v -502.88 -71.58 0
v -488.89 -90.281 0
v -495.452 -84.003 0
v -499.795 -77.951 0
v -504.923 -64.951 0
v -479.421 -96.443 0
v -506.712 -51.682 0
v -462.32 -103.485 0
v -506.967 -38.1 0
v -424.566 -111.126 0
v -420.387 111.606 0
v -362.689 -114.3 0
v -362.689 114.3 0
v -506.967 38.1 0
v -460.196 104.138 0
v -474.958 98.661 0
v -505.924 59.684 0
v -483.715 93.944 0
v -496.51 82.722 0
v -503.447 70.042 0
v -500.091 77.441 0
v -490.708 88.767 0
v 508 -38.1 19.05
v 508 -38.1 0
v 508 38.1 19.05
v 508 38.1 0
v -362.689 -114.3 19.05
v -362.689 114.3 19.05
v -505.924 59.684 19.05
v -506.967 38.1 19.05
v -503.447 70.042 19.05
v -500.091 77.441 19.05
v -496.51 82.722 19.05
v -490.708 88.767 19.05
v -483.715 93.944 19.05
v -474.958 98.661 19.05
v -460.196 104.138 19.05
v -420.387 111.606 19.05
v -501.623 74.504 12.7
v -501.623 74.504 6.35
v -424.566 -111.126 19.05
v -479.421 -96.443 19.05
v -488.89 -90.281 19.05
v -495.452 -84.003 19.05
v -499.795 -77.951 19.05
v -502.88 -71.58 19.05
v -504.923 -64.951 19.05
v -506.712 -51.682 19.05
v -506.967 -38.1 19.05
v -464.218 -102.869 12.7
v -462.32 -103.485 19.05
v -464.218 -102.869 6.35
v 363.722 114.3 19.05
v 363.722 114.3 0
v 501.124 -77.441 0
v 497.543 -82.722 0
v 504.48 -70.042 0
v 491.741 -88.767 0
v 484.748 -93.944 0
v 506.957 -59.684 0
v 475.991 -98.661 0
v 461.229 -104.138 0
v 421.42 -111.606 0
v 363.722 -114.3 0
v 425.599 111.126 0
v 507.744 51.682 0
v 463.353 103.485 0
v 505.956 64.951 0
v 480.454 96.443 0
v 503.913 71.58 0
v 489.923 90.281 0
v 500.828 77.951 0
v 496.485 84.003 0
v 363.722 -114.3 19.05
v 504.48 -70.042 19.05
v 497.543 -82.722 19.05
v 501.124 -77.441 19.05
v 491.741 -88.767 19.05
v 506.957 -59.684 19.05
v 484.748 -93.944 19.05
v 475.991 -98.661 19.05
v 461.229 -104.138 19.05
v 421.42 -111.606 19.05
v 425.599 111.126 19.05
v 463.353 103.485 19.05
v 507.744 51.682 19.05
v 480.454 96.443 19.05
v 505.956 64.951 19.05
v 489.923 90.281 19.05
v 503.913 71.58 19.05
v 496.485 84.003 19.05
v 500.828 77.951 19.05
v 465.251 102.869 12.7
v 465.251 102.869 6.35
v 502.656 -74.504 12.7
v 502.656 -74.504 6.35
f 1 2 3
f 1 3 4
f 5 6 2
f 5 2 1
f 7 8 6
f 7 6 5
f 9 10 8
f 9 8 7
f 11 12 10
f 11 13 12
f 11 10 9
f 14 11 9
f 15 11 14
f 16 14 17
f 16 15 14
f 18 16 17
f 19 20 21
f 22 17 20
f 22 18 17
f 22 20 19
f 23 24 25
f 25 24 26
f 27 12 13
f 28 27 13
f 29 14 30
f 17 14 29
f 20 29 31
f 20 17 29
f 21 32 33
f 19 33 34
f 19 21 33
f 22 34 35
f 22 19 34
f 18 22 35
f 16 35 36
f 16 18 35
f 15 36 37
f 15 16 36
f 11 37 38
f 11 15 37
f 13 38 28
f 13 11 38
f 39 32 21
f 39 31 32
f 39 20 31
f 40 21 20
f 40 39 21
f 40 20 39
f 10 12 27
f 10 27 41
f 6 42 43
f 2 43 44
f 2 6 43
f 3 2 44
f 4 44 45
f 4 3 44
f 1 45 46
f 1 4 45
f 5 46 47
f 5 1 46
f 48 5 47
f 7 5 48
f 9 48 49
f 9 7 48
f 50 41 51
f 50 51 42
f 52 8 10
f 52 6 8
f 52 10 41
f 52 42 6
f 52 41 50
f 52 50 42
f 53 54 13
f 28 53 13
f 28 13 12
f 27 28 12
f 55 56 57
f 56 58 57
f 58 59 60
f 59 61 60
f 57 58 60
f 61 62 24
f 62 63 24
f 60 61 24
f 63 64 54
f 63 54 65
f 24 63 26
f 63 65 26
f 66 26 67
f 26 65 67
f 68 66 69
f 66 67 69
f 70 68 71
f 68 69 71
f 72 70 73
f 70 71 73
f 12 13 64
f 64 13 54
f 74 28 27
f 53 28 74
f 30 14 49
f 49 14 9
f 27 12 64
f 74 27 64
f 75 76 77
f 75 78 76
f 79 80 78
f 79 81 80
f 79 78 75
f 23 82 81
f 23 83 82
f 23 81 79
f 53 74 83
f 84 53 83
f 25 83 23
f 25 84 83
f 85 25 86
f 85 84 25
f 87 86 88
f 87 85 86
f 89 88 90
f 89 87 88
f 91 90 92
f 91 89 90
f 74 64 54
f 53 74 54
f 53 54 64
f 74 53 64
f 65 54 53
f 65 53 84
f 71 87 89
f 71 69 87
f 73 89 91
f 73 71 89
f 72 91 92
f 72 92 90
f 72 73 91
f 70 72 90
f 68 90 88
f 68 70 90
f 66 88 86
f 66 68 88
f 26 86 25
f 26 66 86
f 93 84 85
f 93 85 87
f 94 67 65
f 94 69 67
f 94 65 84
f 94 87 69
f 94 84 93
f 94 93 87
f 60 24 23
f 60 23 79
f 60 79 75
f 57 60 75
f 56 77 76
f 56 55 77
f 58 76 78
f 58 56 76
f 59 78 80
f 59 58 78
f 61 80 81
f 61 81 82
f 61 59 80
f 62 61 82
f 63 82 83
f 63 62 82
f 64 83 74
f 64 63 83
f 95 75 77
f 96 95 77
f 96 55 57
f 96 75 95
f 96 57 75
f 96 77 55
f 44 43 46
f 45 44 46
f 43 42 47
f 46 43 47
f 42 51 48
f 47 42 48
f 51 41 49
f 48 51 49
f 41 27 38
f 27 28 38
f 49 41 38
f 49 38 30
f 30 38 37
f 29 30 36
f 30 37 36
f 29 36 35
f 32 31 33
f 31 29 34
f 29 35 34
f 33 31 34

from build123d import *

# Parameters (mm, degrees)
F1_DEPTH = 19.05
F2_DEPTH = 19.05


# Not quite as in the source:
# - ends of sketch curves that miss each other by under 0.0002 mm in the source are joined


with BuildPart() as f1:
    # F0 (on Top) → F1 (new body)
    with BuildSketch(Plane.XY):
        Polygon((-362.6891076565, 114.2999976873), (-362.6891076565, -114.3000023127), (363.7220774023, -114.3), (363.7220774023, 114.3), align=None)
    extrude(amount=F1_DEPTH)


with BuildPart() as f2:
    # F0 (on Top) → F2 (new body)
    with BuildSketch(Plane.XY):
        with BuildLine():
            Line((363.7220774023, 114.3), (363.7220774023, -114.3))
            add(Edge.make_bspline(
                [(508, -38.1), (508, -75.5596795078), (508, -114.3), (363.7220774023, -114.3)],
                knots=[0.6273362794, 0.6273362794, 0.6273362794, 0.6273362794, 1, 1, 1, 1], degree=3))
            Line((508, -38.1), (508, 38.1))
            add(Edge.make_bspline(
                [(363.7220774023, 114.3), (508, 114.3), (508, 75.5596795078), (508, 38.1)],
                knots=[0, 0, 0, 0, 0.3726637206, 0.3726637206, 0.3726637206, 0.3726637206], degree=3))
        make_face()
    extrude(amount=F2_DEPTH)


with BuildPart() as f2b:
    # F0 (on Top) → F2, piece 2 (new body)
    with BuildSketch(Plane.XY):
        with BuildLine():
            add(Edge.make_bspline(
                [(-362.6891076565, -114.3000023127), (-506.9670302542, -114.3000023127), (-506.9670302542, -75.5596818205), (-506.9670302542, -38.1000023127)],
                knots=[0, 0, 0, 0, 0.3726637206, 0.3726637206, 0.3726637206, 0.3726637206], degree=3))
            Line((-362.6891076565, -114.3000023127), (-362.6891076565, 114.2999976873))
            add(Edge.make_bspline(
                [(-506.9670302542, 38.0999976873), (-506.9670302542, 75.5596771952), (-506.9670302542, 114.2999976873), (-362.6891076565, 114.2999976873)],
                knots=[0.6273362794, 0.6273362794, 0.6273362794, 0.6273362794, 1, 1, 1, 1], degree=3))
            Line((-506.9670302542, 38.0999976873), (-506.9670302542, -38.1000023127))
        make_face()
    extrude(amount=F2_DEPTH)


solid = Compound([f1.part, f2.part, f2b.part])
